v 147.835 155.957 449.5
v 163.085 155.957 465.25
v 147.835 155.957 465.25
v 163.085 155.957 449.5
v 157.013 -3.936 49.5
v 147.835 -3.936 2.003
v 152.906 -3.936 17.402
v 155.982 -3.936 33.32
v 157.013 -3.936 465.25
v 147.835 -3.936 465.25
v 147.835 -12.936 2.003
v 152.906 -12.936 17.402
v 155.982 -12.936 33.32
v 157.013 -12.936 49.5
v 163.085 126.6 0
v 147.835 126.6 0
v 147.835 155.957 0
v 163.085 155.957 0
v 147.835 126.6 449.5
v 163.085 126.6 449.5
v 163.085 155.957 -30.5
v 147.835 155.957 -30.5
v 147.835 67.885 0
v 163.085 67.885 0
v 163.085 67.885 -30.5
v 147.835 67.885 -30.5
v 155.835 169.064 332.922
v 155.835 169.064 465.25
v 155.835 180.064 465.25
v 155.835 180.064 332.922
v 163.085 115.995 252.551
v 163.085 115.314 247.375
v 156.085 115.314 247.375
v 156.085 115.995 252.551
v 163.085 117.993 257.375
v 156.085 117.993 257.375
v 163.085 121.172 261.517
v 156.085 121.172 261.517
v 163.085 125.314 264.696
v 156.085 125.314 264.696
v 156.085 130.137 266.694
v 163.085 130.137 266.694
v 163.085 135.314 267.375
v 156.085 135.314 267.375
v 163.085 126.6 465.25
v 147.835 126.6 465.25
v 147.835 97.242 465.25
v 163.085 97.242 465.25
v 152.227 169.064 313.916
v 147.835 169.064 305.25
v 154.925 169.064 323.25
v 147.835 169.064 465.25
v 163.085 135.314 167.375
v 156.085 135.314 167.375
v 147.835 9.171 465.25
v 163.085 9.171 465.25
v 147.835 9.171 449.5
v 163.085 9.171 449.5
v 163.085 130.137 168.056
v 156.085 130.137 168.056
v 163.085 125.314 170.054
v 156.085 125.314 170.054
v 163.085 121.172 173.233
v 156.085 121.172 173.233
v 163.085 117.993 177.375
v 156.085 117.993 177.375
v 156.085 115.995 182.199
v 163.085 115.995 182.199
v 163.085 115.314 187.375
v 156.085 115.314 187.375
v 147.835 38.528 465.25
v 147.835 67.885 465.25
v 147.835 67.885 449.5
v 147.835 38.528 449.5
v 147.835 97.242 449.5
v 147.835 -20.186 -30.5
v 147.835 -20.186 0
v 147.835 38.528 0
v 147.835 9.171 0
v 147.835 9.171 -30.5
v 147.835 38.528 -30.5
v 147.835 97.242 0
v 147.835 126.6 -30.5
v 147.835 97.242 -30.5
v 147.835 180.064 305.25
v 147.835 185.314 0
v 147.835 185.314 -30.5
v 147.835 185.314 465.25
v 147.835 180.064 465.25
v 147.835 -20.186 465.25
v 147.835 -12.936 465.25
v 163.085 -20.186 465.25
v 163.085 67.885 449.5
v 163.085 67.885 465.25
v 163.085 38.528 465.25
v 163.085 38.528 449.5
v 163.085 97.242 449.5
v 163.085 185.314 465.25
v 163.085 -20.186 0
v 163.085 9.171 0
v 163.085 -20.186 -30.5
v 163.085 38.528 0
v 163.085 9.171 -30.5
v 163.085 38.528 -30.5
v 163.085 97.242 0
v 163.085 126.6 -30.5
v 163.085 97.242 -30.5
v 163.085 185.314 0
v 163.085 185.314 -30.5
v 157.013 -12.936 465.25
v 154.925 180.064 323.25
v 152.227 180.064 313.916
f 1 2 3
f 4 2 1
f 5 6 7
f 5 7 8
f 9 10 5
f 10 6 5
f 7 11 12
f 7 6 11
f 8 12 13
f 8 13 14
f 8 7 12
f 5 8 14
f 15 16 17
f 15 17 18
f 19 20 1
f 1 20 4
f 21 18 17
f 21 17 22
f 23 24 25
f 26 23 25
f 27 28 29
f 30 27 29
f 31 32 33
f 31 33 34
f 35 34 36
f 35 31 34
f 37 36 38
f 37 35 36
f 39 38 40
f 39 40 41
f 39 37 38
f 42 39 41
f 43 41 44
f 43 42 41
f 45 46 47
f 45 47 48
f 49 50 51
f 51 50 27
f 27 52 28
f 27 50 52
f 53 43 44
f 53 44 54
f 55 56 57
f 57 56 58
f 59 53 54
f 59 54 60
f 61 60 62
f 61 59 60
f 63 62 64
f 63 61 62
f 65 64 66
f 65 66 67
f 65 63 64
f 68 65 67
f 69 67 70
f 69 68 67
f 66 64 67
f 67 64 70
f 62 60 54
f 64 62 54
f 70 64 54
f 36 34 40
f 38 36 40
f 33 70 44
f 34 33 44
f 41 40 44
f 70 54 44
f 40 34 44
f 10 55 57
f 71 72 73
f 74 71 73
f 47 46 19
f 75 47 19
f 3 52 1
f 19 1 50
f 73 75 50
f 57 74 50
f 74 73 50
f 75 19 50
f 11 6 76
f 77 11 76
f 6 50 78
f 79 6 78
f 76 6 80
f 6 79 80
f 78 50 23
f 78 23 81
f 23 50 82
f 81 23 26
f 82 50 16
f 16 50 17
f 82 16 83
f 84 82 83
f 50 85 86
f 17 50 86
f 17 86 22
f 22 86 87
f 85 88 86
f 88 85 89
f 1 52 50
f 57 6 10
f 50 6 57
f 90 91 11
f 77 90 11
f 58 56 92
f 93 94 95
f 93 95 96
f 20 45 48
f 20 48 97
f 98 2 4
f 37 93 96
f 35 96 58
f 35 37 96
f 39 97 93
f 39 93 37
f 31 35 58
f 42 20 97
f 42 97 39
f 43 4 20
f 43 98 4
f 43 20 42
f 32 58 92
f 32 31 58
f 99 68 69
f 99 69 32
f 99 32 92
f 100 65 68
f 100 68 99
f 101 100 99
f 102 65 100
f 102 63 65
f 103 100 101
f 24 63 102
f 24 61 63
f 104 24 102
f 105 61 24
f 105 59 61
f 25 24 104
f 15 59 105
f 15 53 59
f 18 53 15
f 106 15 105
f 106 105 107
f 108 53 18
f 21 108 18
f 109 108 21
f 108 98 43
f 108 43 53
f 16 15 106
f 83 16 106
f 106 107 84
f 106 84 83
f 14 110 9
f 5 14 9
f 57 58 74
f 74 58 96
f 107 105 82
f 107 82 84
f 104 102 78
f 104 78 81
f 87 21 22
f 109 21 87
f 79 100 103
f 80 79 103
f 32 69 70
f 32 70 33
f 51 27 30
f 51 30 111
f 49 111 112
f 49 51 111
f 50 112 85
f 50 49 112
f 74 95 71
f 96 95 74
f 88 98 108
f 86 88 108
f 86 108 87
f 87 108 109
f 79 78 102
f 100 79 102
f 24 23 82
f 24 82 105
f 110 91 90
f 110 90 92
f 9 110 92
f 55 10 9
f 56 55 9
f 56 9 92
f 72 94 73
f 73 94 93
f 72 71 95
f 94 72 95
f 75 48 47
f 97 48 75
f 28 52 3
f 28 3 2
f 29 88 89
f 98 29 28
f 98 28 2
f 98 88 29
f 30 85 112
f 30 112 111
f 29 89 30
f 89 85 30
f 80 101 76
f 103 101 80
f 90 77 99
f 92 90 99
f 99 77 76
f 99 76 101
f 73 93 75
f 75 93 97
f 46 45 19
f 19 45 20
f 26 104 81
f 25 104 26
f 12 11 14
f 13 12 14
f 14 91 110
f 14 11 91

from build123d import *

# Parameters (mm, degrees)
ESQUISSE1_W             = 15.25
ESQUISSE1_H             = 205.5
BOSS_EXTRU_1_DEPTH      = 465.25
ESQUISSE2_W             = 30.5
ESQUISSE2_H             = 29.357142857
ESQUISSE2_H_2           = 29.357142858
BOSS_EXTRU_2_DEPTH      = 15.25
ENL_V_MAT_EXTRU_1_REACH = 17.25
ESQUISSE3_W             = 15.75
ESQUISSE3_H             = 29.357142857
ENL_V_MAT_EXTRU_2_DEPTH = 7
ESQUISSE5_W             = 8
ESQUISSE5_H             = 11
ENL_V_MAT_EXTRU_3_DEPTH = 160
ESQUISSE6_W             = 9.17735242
ESQUISSE6_H             = 9
ENL_V_MAT_EXTRU_4_DEPTH = 415.75
ESQUISSE7_R             = 127.5
ENL_V_MAT_EXTRU_5_DEPTH = 9
BOSS_EXTRU_3_REACH      = 18.25


with BuildPart() as part:
    # Esquisse1 → Boss.-Extru.1 (new body)
    with BuildSketch(Plane.XY):
        with Locations((155.460152838, 82.563864629)):
            Rectangle(ESQUISSE1_W, ESQUISSE1_H)
    extrude(amount=BOSS_EXTRU_1_DEPTH)

    # Esquisse2 → Boss.-Extru.2 (add)
    with BuildSketch(Plane(origin=(163.085152838, 0, 0), x_dir=(0, 0, -1), z_dir=(1, 0, 0))):
        with Locations((15.25, 170.635293201)):
            Rectangle(ESQUISSE2_W, ESQUISSE2_H)
        with Locations((15.25, 111.921007486)):
            Rectangle(ESQUISSE2_W, ESQUISSE2_H_2)
        with Locations((15.25, 53.206721771)):
            Rectangle(ESQUISSE2_W, ESQUISSE2_H)
        with Locations((15.25, -5.507563943)):
            Rectangle(ESQUISSE2_W, ESQUISSE2_H)
    extrude(amount=-BOSS_EXTRU_2_DEPTH)

    # Esquisse3 → Enlèv. mat.-Extru.1 (cut, up to next)
    with BuildSketch(Plane(origin=(163.085152838, 0, 0), x_dir=(0, 0, -1), z_dir=(1, 0, 0)), mode=Mode.PRIVATE) as enl_v_mat_extru_1_sk1:
        with Locations((-457.375, 141.278150344)):
            Rectangle(ESQUISSE3_W, ESQUISSE3_H)
    enl_v_mat_extru_1_tool1 = extrude(enl_v_mat_extru_1_sk1.sketch, amount=-ENL_V_MAT_EXTRU_1_REACH, mode=Mode.PRIVATE) & part.part
    add(enl_v_mat_extru_1_tool1.solids().sort_by_distance((163.085153, 141.27815, 457.375))[0], mode=Mode.SUBTRACT)
    # Esquisse3 → Enlèv. mat.-Extru.1 (cut, up to next)
    with BuildSketch(Plane(origin=(163.085152838, 0, 0), x_dir=(0, 0, -1), z_dir=(1, 0, 0)), mode=Mode.PRIVATE) as enl_v_mat_extru_1_sk2:
        with Locations((-457.375, 82.563864628)):
            Rectangle(ESQUISSE3_W, ESQUISSE3_H)
    enl_v_mat_extru_1_tool2 = extrude(enl_v_mat_extru_1_sk2.sketch, amount=-ENL_V_MAT_EXTRU_1_REACH, mode=Mode.PRIVATE) & part.part
    add(enl_v_mat_extru_1_tool2.solids().sort_by_distance((163.085153, 82.563865, 457.375))[0], mode=Mode.SUBTRACT)
    # Esquisse3 → Enlèv. mat.-Extru.1 (cut, up to next)
    with BuildSketch(Plane(origin=(163.085152838, 0, 0), x_dir=(0, 0, -1), z_dir=(1, 0, 0)), mode=Mode.PRIVATE) as enl_v_mat_extru_1_sk3:
        with Locations((-457.375, 23.849578915)):
            Rectangle(ESQUISSE3_W, ESQUISSE3_H)
    enl_v_mat_extru_1_tool3 = extrude(enl_v_mat_extru_1_sk3.sketch, amount=-ENL_V_MAT_EXTRU_1_REACH, mode=Mode.PRIVATE) & part.part
    add(enl_v_mat_extru_1_tool3.solids().sort_by_distance((163.085153, 23.849579, 457.375))[0], mode=Mode.SUBTRACT)

    # Esquisse4 → Enlèv. mat.-Extru.2 (cut)
    with BuildSketch(Plane(origin=(163.085152838, 0, 0), x_dir=(0, 0, -1), z_dir=(1, 0, 0))):
        with BuildLine():
            Line((-267.375, 135.313864629), (-167.375, 135.313864629))
            ThreePointArc((-167.375, 135.313864629), (-173.232864376, 121.171729005), (-187.375, 115.313864629))
            Line((-187.375, 115.313864629), (-247.375, 115.313864629))
            ThreePointArc((-247.375, 115.313864629), (-261.517135624, 121.171729005), (-267.375, 135.313864629))
        make_face()
    extrude(amount=-ENL_V_MAT_EXTRU_2_DEPTH, mode=Mode.SUBTRACT)

    # Esquisse5 → Enlèv. mat.-Extru.3 (cut)
    with BuildSketch(Plane.XY.offset(465.25)):
        with Locations((151.835152838, 174.563864629)):
            Rectangle(ESQUISSE5_W, ESQUISSE5_H)
    extrude(amount=-ENL_V_MAT_EXTRU_3_DEPTH, mode=Mode.SUBTRACT)

    # Esquisse6 → Enlèv. mat.-Extru.4 (cut)
    with BuildSketch(Plane.XY.offset(465.25)):
        with Locations((152.423829048, -8.436135371)):
            Rectangle(ESQUISSE6_W, ESQUISSE6_H)
    extrude(amount=-ENL_V_MAT_EXTRU_4_DEPTH, mode=Mode.SUBTRACT)

    # Esquisse7 → Enlèv. mat.-Extru.5 (cut)
    with BuildSketch(Plane.XZ.offset(3.936135371)):
        with Locations((29.512505258, 49.5)):
            Circle(ESQUISSE7_R)
    extrude(amount=ENL_V_MAT_EXTRU_5_DEPTH, mode=Mode.SUBTRACT)

    # Esquisse8 → Boss.-Extru.3 (add, up to next)
    with BuildSketch(Plane(origin=(0, 169.063864629, 0), x_dir=(1, 0, 0), z_dir=(0, 1, 0)), mode=Mode.PRIVATE) as boss_extru_3_sk1:
        with BuildLine():
            Line((147.835152838, -305.25), (155.835152838, -305.25))
            Line((155.835152838, -305.25), (155.835152838, -332.922407507))
            ThreePointArc((155.835152838, -332.922407507), (153.795024483, -318.519611448), (147.835152838, -305.25))
        make_face()
    boss_extru_3_tool1 = extrude(boss_extru_3_sk1.sketch, amount=BOSS_EXTRU_3_REACH, mode=Mode.PRIVATE) - part.part
    add(boss_extru_3_tool1.solids().sort_by_distance((153.470601, 169.063865, 312.056849))[0])


solid = part.part
